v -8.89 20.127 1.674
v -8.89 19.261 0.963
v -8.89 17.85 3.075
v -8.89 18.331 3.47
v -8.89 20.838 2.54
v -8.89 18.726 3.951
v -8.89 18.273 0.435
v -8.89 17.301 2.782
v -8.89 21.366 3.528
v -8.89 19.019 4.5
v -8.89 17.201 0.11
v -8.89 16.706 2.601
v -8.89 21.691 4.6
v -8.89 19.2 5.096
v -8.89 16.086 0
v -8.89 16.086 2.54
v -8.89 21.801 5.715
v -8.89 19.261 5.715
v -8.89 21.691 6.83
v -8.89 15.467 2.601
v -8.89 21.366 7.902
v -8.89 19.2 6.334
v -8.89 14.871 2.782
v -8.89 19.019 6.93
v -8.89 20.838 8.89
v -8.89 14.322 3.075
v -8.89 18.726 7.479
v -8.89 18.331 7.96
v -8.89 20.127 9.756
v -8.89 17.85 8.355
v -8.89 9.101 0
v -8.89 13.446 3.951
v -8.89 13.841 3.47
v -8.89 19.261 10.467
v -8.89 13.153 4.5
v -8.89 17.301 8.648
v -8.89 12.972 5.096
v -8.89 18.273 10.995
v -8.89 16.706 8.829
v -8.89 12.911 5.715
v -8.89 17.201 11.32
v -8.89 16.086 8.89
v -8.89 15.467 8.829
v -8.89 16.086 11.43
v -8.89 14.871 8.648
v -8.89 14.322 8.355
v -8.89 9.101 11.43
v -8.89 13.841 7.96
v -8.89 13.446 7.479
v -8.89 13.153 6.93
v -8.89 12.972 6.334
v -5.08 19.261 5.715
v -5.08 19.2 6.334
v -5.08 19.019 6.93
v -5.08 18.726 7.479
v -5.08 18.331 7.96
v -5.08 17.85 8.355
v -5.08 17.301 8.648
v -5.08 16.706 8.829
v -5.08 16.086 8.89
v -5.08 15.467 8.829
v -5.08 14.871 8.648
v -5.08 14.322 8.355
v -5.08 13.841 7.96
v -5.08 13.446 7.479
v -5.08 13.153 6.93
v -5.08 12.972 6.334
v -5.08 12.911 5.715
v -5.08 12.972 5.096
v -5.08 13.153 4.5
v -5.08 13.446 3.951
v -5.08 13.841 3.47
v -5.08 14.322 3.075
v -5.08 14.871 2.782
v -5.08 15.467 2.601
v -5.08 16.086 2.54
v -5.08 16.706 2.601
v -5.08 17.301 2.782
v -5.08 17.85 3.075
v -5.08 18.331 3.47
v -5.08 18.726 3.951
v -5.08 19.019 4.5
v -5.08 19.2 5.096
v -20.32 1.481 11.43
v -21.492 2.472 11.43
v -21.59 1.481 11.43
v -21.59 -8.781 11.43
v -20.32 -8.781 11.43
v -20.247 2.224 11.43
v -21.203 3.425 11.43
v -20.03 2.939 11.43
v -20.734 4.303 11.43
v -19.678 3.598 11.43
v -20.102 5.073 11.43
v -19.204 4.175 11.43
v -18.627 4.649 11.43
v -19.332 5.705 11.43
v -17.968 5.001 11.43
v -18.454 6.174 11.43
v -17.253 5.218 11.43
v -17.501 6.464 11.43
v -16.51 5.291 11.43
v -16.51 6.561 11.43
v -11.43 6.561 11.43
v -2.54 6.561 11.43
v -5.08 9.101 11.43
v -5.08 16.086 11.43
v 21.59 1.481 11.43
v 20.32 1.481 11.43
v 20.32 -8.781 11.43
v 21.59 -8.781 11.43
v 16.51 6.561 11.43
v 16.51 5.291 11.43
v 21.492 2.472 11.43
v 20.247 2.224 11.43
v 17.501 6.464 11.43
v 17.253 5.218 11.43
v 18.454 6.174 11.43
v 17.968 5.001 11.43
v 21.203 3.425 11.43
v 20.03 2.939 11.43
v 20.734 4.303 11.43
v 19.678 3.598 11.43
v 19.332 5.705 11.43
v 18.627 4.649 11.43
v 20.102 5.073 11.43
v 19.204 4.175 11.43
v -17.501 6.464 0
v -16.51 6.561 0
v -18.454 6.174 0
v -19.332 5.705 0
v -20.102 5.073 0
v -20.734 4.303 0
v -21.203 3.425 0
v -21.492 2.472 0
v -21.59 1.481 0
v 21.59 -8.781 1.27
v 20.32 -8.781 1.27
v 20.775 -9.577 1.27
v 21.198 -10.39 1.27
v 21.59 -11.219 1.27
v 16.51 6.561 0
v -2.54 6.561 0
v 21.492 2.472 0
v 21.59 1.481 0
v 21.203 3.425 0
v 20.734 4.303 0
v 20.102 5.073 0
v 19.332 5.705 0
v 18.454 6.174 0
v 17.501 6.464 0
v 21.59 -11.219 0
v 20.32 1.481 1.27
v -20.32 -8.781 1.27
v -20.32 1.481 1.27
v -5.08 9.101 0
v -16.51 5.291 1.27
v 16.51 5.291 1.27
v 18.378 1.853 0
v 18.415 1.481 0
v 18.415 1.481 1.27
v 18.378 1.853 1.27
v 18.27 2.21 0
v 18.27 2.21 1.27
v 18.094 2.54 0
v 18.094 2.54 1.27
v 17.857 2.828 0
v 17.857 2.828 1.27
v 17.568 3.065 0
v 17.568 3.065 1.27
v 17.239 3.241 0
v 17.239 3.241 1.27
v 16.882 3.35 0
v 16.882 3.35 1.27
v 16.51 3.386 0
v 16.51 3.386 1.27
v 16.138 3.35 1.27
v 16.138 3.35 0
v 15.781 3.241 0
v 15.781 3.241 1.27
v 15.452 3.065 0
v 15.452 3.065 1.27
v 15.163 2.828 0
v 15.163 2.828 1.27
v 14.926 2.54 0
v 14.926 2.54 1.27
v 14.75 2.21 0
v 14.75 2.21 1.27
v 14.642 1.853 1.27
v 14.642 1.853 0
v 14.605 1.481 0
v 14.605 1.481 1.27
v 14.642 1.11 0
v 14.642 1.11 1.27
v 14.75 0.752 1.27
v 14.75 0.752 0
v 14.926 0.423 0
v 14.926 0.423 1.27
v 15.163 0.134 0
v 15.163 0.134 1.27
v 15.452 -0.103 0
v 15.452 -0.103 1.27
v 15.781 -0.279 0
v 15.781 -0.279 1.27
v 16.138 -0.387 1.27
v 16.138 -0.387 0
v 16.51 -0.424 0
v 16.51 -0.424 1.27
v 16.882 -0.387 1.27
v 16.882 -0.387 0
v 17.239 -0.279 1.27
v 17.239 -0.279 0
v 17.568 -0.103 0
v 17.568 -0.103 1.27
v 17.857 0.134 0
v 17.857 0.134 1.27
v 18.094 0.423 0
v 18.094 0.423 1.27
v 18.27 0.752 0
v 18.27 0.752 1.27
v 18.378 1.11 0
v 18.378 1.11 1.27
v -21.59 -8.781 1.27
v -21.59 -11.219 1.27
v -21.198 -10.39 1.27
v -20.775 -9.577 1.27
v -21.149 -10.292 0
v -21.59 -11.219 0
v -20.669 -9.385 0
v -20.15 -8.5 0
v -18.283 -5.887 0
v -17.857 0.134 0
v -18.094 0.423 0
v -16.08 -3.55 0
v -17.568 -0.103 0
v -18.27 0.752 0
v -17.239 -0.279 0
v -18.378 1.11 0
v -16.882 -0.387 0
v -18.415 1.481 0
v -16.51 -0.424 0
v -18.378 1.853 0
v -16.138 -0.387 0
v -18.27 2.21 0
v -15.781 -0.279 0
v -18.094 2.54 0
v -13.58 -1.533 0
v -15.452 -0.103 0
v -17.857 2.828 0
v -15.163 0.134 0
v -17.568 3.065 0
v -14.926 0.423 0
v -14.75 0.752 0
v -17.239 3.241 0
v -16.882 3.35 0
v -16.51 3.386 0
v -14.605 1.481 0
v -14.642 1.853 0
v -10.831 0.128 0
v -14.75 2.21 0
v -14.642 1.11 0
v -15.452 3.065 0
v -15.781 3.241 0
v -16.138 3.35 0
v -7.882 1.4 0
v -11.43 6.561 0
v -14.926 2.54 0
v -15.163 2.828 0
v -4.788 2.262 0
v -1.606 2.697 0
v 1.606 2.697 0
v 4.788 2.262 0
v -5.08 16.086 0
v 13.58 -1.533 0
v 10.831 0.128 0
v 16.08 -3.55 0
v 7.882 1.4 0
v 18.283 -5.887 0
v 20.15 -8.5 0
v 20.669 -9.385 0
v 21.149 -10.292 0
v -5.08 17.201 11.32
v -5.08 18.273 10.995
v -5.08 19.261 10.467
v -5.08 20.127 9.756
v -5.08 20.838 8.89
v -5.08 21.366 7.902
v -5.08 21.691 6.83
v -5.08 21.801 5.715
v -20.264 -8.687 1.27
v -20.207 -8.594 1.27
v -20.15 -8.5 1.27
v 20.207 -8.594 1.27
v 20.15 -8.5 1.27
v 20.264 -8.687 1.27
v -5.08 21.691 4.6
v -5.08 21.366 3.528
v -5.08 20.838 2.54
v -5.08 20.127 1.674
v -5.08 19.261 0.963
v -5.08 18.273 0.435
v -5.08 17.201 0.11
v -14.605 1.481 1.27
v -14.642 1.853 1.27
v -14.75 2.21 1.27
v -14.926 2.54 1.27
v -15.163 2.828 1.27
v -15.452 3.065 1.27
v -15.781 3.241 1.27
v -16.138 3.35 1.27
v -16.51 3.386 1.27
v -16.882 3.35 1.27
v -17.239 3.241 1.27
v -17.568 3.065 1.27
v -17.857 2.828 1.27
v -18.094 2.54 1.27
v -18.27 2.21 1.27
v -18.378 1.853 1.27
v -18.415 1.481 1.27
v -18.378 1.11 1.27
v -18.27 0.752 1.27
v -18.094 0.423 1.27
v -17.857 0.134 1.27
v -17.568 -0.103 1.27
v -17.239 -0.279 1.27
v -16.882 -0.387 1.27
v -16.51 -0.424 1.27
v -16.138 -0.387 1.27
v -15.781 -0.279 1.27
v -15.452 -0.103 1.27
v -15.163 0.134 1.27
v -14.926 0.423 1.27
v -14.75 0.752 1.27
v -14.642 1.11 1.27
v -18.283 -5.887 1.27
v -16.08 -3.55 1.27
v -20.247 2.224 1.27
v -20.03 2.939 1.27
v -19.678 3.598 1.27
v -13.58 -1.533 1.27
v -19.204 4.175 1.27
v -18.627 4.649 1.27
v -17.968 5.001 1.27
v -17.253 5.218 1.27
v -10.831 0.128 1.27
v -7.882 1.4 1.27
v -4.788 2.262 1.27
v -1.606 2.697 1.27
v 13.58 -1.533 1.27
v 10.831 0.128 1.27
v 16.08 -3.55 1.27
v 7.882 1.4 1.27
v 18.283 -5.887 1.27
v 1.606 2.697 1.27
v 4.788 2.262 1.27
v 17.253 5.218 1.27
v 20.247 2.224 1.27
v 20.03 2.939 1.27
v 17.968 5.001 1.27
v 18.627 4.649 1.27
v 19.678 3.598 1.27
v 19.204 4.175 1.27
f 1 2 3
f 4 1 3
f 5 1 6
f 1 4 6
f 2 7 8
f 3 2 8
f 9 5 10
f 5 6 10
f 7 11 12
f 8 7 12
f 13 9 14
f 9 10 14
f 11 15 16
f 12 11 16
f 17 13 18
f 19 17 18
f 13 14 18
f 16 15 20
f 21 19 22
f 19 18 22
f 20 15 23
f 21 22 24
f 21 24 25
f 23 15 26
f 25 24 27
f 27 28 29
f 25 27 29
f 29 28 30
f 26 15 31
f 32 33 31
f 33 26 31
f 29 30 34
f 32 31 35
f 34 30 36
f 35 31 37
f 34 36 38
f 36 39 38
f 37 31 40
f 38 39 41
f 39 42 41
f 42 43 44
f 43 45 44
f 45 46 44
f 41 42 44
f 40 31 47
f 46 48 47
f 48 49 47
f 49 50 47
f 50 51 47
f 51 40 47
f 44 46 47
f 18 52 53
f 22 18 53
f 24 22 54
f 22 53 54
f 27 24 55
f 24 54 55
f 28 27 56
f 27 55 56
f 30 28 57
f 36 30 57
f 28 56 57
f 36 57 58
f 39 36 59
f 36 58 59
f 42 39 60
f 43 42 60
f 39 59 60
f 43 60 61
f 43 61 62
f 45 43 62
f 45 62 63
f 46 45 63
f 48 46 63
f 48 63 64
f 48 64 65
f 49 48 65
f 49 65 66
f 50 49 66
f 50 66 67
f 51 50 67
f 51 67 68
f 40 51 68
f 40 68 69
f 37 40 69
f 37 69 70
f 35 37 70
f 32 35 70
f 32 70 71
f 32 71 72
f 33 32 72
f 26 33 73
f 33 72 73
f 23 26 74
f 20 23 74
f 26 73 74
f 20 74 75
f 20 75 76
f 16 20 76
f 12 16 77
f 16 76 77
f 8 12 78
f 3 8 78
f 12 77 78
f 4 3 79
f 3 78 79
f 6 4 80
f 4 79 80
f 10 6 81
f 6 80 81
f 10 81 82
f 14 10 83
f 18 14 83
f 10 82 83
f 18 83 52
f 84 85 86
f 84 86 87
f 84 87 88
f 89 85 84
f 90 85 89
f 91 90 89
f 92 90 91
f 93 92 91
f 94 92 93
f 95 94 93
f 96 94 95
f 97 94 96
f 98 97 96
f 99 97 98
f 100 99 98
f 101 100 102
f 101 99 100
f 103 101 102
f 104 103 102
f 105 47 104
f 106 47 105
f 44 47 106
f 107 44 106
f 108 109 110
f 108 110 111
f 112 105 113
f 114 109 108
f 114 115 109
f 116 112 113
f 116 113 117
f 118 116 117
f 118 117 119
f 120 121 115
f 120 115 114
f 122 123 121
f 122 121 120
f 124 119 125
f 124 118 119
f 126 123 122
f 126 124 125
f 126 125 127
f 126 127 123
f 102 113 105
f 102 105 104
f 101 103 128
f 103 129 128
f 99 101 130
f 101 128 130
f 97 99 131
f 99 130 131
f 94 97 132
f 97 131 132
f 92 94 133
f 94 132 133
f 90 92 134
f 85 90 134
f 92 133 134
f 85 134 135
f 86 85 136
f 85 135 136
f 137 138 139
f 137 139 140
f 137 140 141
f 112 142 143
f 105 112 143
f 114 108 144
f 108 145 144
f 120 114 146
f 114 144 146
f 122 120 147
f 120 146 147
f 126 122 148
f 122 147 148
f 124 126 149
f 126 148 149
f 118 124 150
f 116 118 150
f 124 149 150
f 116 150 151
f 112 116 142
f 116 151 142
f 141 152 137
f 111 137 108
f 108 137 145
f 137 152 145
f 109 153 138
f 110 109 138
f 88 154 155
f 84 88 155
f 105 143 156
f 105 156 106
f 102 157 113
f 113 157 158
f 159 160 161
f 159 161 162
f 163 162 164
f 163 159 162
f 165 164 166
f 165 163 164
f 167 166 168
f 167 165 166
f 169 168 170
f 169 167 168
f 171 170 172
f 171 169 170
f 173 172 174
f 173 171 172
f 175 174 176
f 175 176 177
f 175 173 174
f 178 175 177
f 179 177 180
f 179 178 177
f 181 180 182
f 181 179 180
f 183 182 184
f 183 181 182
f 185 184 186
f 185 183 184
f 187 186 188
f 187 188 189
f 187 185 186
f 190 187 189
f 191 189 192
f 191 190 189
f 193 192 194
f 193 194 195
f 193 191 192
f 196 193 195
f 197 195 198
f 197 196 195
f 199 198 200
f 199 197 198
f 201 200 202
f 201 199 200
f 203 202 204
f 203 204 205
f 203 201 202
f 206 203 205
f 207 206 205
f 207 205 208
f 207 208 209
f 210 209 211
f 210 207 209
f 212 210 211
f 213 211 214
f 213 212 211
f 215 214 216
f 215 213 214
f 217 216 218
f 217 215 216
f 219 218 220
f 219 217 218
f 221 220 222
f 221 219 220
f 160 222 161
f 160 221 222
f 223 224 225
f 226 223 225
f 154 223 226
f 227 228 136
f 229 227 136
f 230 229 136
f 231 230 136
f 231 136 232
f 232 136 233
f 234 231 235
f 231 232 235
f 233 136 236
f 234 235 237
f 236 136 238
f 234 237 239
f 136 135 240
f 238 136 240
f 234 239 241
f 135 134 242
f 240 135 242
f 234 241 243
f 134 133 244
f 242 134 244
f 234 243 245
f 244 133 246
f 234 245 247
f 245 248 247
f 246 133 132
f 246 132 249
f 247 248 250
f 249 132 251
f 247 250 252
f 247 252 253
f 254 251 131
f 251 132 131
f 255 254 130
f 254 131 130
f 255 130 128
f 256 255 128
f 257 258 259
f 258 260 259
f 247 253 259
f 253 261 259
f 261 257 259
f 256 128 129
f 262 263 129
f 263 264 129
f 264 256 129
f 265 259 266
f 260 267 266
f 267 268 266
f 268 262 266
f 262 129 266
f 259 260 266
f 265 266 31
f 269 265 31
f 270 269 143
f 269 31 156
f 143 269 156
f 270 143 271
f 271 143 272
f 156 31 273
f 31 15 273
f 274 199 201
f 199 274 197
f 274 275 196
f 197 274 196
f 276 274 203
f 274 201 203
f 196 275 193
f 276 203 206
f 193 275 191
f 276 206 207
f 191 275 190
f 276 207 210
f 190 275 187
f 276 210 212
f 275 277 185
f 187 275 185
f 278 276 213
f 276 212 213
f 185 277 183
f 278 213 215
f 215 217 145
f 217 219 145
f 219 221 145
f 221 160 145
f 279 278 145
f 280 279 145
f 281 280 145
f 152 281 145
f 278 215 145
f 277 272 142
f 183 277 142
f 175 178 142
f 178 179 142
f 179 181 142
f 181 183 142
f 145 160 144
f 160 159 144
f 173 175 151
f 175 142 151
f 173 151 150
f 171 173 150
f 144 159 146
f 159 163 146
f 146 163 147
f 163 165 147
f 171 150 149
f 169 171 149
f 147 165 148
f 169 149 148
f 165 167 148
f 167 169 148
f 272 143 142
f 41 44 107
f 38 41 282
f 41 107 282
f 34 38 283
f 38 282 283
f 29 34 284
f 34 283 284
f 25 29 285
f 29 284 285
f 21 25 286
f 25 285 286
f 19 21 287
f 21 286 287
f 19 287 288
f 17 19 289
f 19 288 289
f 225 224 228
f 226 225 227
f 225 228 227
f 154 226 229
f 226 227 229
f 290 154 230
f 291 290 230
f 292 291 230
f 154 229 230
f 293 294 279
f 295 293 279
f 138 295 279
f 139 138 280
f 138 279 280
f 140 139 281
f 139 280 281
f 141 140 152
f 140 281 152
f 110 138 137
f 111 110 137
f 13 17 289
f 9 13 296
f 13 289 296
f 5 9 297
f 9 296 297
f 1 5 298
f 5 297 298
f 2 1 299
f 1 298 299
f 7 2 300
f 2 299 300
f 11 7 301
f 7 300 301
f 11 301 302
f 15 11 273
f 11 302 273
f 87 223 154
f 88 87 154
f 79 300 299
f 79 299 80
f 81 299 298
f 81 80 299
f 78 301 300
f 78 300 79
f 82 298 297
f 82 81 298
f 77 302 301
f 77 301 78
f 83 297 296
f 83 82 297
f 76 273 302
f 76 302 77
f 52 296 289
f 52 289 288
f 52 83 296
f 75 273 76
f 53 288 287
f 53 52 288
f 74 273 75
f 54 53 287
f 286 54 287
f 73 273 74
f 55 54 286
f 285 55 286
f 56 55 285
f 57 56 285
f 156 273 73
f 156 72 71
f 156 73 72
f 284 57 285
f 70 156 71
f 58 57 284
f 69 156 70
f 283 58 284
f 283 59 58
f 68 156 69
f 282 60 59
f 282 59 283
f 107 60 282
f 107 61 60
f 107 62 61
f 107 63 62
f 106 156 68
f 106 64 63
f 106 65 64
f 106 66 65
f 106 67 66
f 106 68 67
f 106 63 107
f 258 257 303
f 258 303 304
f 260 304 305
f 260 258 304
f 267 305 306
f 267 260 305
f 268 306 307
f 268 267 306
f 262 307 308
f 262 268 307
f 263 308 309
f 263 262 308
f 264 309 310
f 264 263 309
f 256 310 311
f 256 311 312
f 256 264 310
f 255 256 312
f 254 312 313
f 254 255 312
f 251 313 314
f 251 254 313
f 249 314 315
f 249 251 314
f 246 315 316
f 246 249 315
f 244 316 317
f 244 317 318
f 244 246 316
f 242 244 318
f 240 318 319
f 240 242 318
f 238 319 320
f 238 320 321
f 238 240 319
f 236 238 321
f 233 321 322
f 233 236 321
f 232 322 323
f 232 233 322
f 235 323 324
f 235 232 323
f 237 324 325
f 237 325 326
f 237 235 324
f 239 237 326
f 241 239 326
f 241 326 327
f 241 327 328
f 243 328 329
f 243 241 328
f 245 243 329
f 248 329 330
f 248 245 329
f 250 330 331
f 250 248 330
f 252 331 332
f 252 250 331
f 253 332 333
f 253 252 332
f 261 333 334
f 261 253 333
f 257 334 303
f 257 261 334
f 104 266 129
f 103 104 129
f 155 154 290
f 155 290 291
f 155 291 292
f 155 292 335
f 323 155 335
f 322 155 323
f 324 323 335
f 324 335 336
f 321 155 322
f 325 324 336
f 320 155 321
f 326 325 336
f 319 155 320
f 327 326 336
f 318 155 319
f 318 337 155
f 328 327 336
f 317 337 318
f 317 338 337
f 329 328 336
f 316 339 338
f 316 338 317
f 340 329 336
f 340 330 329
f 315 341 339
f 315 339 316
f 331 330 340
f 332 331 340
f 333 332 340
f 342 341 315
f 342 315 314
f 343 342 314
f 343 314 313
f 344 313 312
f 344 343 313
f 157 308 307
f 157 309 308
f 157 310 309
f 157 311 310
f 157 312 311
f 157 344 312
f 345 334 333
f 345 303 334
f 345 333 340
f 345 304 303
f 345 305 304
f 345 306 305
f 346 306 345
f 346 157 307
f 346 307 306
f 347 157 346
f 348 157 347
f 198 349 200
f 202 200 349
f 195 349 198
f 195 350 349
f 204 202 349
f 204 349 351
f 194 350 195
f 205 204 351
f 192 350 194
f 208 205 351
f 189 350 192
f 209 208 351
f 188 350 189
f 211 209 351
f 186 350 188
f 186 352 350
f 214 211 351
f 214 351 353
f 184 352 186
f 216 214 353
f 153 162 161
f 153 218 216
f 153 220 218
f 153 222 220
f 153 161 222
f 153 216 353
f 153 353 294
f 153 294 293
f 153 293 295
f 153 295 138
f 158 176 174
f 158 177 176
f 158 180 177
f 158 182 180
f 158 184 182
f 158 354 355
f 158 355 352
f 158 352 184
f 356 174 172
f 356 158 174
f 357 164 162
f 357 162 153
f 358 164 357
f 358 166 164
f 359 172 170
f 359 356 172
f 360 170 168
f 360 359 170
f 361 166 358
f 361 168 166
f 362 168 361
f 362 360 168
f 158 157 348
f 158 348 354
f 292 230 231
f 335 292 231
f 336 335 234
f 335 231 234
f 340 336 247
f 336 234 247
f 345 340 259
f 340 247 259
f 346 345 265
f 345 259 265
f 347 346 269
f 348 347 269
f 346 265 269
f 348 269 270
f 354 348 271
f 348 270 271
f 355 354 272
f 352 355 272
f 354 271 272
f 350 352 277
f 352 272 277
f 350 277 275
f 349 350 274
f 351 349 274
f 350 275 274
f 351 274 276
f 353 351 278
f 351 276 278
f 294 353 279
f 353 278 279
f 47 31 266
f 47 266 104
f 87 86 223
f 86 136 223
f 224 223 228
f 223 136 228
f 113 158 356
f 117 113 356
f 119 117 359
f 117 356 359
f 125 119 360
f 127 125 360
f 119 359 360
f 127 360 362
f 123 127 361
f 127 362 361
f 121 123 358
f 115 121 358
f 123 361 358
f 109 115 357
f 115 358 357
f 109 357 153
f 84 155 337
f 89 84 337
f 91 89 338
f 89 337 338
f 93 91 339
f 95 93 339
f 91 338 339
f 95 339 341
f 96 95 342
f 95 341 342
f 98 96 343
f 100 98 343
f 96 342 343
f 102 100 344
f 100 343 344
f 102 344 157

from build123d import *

# Parameters (mm, degrees)
F0_R     = 1.905
F1_DEPTH = 1.27
F3_DEPTH = 10.16
F4_W     = 3.81
F4_H     = 11.43
F5_DEPTH = 15.24
F6_R     = 3.175
F7_DEPTH = 25.4
F8_SIZE  = 2.54


with BuildPart() as f1:
    # F0 (on Top) → F1 (new body)
    with BuildSketch(Plane.XY):
        with BuildLine():
            Line((16.51, 6.561151), (-16.51, 6.561151))
            ThreePointArc((-16.51, 6.561151), (-20.102102, 5.073253), (-21.59, 1.481151))
            Line((-21.59, 1.481151), (-21.59, -8.500309))
            Line((-21.59, -8.500309), (-20.149636, -8.500309))
            ThreePointArc((-20.149636, -8.500309), (0, 2.751151), (20.149636, -8.500309))
            Line((20.149636, -8.500309), (21.59, -8.500309))
            Line((21.59, -8.500309), (21.59, 1.481151))
            ThreePointArc((21.59, 1.481151), (20.102102, 5.073253), (16.51, 6.561151))
        make_face()
        with Locations((-16.51, 1.481151)):
            Circle(F0_R, mode=Mode.SUBTRACT)
        with Locations((16.51, 1.481151)):
            Circle(F0_R, mode=Mode.SUBTRACT)
        with BuildLine():
            Line((-20.149636, -8.500309), (-21.59, -8.500309))
            Line((-21.59, -8.500309), (-21.59, -11.218849))
            ThreePointArc((-21.59, -11.218849), (-20.914037, -9.836151), (-20.149636, -8.500309))
        make_face()
        with BuildLine():
            Line((21.59, -11.218849), (21.59, -8.500309))
            Line((21.59, -8.500309), (20.149636, -8.500309))
            ThreePointArc((20.149636, -8.500309), (20.914037, -9.836151), (21.59, -11.218849))
        make_face()
    extrude(amount=F1_DEPTH)

    # F2 (on face) → F3 (join)
    with BuildSketch(Plane.XY.offset(1.27)):
        with BuildLine():
            Line((21.59, -8.781116), (21.59, 1.481151))
            ThreePointArc((21.59, 1.481151), (20.102102, 5.073253), (16.51, 6.561151))
            Line((16.51, 6.561151), (-16.51, 6.561151))
            ThreePointArc((-16.51, 6.561151), (-20.102102, 5.073253), (-21.59, 1.481151))
            Line((-21.59, 1.481151), (-21.59, -8.781116))
            Line((-21.59, -8.781116), (-20.32, -8.781116))
            Line((-20.32, -8.781116), (-20.32, 1.481151))
            ThreePointArc((-20.32, 1.481151), (-19.204077, 4.175228), (-16.51, 5.291151))
            Line((-16.51, 5.291151), (16.51, 5.291151))
            ThreePointArc((16.51, 5.291151), (19.204077, 4.175228), (20.32, 1.481151))
            Line((20.32, 1.481151), (20.32, -8.781116))
            Line((20.32, -8.781116), (21.59, -8.781116))
        make_face()
    extrude(amount=F3_DEPTH)

    # F4 (on face) → F5 (join)
    with BuildSketch(Plane(origin=(0, 6.561151, 0), x_dir=(-1, 0, 0), z_dir=(0, 1, 0))):
        with Locations((6.985, 5.715)):
            Rectangle(F4_W, F4_H)
    extrude(amount=F5_DEPTH)

    # F6 (on face) → F7 (cut)
    with BuildSketch(Plane.YZ.offset(-5.08)):
        with BuildLine():
            ThreePointArc((21.801151, 5.715), (20.127266, 1.673885), (16.086151, 0))
            Line((16.086151, 0), (21.801151, 0))
            Line((21.801151, 0), (21.801151, 5.715))
        make_face()
        with Locations((16.086151, 5.715)):
            Circle(F6_R)
        with BuildLine():
            ThreePointArc((16.086151, 11.43), (20.127266, 9.756115), (21.801151, 5.715))
            Line((21.801151, 5.715), (21.801151, 11.43))
            Line((21.801151, 11.43), (16.086151, 11.43))
        make_face()
    extrude(amount=-F7_DEPTH, mode=Mode.SUBTRACT)

    # F8
    f8_edges = [f1.edges().sort_by_distance(p)[0] for p in [
        (-5.08, 6.561151, 5.715),
        (-8.89, 6.561151, 5.715),
    ]]
    chamfer(f8_edges, length=F8_SIZE)


solid = f1.part
